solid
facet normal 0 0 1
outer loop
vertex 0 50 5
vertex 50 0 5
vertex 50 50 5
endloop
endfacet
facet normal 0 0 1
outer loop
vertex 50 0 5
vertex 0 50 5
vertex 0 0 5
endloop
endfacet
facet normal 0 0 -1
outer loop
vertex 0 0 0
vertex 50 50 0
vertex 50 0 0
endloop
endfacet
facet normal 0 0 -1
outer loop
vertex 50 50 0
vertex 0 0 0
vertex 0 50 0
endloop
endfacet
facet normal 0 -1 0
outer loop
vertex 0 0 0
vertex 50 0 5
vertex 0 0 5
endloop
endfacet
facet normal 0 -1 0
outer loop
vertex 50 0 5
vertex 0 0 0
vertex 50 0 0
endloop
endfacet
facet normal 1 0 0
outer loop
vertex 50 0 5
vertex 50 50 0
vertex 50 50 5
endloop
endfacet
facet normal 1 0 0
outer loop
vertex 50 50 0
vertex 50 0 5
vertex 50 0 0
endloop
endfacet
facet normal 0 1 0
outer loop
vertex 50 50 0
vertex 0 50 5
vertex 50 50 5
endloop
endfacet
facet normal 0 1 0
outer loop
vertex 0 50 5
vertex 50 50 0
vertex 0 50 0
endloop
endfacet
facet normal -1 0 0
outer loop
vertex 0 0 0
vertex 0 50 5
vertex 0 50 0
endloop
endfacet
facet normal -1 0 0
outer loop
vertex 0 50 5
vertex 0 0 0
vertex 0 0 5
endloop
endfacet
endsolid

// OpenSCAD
appoggio_misX = 50;
appoggio_misY = 50;
spessore = 5;
altezza = 45;
raggio_foro = 1.5;

cube([appoggio_misX,appoggio_misY,spessore]);

difference(){
color("red");
translate([0,0,spessore])
cube([appoggio_misX,spessore,altezza-spessore]);
#translate([appoggio_misX/2,spessore,altezza/2])
rotate([90,0,0])
cylinder(spessore*2,raggio_foro);
}
